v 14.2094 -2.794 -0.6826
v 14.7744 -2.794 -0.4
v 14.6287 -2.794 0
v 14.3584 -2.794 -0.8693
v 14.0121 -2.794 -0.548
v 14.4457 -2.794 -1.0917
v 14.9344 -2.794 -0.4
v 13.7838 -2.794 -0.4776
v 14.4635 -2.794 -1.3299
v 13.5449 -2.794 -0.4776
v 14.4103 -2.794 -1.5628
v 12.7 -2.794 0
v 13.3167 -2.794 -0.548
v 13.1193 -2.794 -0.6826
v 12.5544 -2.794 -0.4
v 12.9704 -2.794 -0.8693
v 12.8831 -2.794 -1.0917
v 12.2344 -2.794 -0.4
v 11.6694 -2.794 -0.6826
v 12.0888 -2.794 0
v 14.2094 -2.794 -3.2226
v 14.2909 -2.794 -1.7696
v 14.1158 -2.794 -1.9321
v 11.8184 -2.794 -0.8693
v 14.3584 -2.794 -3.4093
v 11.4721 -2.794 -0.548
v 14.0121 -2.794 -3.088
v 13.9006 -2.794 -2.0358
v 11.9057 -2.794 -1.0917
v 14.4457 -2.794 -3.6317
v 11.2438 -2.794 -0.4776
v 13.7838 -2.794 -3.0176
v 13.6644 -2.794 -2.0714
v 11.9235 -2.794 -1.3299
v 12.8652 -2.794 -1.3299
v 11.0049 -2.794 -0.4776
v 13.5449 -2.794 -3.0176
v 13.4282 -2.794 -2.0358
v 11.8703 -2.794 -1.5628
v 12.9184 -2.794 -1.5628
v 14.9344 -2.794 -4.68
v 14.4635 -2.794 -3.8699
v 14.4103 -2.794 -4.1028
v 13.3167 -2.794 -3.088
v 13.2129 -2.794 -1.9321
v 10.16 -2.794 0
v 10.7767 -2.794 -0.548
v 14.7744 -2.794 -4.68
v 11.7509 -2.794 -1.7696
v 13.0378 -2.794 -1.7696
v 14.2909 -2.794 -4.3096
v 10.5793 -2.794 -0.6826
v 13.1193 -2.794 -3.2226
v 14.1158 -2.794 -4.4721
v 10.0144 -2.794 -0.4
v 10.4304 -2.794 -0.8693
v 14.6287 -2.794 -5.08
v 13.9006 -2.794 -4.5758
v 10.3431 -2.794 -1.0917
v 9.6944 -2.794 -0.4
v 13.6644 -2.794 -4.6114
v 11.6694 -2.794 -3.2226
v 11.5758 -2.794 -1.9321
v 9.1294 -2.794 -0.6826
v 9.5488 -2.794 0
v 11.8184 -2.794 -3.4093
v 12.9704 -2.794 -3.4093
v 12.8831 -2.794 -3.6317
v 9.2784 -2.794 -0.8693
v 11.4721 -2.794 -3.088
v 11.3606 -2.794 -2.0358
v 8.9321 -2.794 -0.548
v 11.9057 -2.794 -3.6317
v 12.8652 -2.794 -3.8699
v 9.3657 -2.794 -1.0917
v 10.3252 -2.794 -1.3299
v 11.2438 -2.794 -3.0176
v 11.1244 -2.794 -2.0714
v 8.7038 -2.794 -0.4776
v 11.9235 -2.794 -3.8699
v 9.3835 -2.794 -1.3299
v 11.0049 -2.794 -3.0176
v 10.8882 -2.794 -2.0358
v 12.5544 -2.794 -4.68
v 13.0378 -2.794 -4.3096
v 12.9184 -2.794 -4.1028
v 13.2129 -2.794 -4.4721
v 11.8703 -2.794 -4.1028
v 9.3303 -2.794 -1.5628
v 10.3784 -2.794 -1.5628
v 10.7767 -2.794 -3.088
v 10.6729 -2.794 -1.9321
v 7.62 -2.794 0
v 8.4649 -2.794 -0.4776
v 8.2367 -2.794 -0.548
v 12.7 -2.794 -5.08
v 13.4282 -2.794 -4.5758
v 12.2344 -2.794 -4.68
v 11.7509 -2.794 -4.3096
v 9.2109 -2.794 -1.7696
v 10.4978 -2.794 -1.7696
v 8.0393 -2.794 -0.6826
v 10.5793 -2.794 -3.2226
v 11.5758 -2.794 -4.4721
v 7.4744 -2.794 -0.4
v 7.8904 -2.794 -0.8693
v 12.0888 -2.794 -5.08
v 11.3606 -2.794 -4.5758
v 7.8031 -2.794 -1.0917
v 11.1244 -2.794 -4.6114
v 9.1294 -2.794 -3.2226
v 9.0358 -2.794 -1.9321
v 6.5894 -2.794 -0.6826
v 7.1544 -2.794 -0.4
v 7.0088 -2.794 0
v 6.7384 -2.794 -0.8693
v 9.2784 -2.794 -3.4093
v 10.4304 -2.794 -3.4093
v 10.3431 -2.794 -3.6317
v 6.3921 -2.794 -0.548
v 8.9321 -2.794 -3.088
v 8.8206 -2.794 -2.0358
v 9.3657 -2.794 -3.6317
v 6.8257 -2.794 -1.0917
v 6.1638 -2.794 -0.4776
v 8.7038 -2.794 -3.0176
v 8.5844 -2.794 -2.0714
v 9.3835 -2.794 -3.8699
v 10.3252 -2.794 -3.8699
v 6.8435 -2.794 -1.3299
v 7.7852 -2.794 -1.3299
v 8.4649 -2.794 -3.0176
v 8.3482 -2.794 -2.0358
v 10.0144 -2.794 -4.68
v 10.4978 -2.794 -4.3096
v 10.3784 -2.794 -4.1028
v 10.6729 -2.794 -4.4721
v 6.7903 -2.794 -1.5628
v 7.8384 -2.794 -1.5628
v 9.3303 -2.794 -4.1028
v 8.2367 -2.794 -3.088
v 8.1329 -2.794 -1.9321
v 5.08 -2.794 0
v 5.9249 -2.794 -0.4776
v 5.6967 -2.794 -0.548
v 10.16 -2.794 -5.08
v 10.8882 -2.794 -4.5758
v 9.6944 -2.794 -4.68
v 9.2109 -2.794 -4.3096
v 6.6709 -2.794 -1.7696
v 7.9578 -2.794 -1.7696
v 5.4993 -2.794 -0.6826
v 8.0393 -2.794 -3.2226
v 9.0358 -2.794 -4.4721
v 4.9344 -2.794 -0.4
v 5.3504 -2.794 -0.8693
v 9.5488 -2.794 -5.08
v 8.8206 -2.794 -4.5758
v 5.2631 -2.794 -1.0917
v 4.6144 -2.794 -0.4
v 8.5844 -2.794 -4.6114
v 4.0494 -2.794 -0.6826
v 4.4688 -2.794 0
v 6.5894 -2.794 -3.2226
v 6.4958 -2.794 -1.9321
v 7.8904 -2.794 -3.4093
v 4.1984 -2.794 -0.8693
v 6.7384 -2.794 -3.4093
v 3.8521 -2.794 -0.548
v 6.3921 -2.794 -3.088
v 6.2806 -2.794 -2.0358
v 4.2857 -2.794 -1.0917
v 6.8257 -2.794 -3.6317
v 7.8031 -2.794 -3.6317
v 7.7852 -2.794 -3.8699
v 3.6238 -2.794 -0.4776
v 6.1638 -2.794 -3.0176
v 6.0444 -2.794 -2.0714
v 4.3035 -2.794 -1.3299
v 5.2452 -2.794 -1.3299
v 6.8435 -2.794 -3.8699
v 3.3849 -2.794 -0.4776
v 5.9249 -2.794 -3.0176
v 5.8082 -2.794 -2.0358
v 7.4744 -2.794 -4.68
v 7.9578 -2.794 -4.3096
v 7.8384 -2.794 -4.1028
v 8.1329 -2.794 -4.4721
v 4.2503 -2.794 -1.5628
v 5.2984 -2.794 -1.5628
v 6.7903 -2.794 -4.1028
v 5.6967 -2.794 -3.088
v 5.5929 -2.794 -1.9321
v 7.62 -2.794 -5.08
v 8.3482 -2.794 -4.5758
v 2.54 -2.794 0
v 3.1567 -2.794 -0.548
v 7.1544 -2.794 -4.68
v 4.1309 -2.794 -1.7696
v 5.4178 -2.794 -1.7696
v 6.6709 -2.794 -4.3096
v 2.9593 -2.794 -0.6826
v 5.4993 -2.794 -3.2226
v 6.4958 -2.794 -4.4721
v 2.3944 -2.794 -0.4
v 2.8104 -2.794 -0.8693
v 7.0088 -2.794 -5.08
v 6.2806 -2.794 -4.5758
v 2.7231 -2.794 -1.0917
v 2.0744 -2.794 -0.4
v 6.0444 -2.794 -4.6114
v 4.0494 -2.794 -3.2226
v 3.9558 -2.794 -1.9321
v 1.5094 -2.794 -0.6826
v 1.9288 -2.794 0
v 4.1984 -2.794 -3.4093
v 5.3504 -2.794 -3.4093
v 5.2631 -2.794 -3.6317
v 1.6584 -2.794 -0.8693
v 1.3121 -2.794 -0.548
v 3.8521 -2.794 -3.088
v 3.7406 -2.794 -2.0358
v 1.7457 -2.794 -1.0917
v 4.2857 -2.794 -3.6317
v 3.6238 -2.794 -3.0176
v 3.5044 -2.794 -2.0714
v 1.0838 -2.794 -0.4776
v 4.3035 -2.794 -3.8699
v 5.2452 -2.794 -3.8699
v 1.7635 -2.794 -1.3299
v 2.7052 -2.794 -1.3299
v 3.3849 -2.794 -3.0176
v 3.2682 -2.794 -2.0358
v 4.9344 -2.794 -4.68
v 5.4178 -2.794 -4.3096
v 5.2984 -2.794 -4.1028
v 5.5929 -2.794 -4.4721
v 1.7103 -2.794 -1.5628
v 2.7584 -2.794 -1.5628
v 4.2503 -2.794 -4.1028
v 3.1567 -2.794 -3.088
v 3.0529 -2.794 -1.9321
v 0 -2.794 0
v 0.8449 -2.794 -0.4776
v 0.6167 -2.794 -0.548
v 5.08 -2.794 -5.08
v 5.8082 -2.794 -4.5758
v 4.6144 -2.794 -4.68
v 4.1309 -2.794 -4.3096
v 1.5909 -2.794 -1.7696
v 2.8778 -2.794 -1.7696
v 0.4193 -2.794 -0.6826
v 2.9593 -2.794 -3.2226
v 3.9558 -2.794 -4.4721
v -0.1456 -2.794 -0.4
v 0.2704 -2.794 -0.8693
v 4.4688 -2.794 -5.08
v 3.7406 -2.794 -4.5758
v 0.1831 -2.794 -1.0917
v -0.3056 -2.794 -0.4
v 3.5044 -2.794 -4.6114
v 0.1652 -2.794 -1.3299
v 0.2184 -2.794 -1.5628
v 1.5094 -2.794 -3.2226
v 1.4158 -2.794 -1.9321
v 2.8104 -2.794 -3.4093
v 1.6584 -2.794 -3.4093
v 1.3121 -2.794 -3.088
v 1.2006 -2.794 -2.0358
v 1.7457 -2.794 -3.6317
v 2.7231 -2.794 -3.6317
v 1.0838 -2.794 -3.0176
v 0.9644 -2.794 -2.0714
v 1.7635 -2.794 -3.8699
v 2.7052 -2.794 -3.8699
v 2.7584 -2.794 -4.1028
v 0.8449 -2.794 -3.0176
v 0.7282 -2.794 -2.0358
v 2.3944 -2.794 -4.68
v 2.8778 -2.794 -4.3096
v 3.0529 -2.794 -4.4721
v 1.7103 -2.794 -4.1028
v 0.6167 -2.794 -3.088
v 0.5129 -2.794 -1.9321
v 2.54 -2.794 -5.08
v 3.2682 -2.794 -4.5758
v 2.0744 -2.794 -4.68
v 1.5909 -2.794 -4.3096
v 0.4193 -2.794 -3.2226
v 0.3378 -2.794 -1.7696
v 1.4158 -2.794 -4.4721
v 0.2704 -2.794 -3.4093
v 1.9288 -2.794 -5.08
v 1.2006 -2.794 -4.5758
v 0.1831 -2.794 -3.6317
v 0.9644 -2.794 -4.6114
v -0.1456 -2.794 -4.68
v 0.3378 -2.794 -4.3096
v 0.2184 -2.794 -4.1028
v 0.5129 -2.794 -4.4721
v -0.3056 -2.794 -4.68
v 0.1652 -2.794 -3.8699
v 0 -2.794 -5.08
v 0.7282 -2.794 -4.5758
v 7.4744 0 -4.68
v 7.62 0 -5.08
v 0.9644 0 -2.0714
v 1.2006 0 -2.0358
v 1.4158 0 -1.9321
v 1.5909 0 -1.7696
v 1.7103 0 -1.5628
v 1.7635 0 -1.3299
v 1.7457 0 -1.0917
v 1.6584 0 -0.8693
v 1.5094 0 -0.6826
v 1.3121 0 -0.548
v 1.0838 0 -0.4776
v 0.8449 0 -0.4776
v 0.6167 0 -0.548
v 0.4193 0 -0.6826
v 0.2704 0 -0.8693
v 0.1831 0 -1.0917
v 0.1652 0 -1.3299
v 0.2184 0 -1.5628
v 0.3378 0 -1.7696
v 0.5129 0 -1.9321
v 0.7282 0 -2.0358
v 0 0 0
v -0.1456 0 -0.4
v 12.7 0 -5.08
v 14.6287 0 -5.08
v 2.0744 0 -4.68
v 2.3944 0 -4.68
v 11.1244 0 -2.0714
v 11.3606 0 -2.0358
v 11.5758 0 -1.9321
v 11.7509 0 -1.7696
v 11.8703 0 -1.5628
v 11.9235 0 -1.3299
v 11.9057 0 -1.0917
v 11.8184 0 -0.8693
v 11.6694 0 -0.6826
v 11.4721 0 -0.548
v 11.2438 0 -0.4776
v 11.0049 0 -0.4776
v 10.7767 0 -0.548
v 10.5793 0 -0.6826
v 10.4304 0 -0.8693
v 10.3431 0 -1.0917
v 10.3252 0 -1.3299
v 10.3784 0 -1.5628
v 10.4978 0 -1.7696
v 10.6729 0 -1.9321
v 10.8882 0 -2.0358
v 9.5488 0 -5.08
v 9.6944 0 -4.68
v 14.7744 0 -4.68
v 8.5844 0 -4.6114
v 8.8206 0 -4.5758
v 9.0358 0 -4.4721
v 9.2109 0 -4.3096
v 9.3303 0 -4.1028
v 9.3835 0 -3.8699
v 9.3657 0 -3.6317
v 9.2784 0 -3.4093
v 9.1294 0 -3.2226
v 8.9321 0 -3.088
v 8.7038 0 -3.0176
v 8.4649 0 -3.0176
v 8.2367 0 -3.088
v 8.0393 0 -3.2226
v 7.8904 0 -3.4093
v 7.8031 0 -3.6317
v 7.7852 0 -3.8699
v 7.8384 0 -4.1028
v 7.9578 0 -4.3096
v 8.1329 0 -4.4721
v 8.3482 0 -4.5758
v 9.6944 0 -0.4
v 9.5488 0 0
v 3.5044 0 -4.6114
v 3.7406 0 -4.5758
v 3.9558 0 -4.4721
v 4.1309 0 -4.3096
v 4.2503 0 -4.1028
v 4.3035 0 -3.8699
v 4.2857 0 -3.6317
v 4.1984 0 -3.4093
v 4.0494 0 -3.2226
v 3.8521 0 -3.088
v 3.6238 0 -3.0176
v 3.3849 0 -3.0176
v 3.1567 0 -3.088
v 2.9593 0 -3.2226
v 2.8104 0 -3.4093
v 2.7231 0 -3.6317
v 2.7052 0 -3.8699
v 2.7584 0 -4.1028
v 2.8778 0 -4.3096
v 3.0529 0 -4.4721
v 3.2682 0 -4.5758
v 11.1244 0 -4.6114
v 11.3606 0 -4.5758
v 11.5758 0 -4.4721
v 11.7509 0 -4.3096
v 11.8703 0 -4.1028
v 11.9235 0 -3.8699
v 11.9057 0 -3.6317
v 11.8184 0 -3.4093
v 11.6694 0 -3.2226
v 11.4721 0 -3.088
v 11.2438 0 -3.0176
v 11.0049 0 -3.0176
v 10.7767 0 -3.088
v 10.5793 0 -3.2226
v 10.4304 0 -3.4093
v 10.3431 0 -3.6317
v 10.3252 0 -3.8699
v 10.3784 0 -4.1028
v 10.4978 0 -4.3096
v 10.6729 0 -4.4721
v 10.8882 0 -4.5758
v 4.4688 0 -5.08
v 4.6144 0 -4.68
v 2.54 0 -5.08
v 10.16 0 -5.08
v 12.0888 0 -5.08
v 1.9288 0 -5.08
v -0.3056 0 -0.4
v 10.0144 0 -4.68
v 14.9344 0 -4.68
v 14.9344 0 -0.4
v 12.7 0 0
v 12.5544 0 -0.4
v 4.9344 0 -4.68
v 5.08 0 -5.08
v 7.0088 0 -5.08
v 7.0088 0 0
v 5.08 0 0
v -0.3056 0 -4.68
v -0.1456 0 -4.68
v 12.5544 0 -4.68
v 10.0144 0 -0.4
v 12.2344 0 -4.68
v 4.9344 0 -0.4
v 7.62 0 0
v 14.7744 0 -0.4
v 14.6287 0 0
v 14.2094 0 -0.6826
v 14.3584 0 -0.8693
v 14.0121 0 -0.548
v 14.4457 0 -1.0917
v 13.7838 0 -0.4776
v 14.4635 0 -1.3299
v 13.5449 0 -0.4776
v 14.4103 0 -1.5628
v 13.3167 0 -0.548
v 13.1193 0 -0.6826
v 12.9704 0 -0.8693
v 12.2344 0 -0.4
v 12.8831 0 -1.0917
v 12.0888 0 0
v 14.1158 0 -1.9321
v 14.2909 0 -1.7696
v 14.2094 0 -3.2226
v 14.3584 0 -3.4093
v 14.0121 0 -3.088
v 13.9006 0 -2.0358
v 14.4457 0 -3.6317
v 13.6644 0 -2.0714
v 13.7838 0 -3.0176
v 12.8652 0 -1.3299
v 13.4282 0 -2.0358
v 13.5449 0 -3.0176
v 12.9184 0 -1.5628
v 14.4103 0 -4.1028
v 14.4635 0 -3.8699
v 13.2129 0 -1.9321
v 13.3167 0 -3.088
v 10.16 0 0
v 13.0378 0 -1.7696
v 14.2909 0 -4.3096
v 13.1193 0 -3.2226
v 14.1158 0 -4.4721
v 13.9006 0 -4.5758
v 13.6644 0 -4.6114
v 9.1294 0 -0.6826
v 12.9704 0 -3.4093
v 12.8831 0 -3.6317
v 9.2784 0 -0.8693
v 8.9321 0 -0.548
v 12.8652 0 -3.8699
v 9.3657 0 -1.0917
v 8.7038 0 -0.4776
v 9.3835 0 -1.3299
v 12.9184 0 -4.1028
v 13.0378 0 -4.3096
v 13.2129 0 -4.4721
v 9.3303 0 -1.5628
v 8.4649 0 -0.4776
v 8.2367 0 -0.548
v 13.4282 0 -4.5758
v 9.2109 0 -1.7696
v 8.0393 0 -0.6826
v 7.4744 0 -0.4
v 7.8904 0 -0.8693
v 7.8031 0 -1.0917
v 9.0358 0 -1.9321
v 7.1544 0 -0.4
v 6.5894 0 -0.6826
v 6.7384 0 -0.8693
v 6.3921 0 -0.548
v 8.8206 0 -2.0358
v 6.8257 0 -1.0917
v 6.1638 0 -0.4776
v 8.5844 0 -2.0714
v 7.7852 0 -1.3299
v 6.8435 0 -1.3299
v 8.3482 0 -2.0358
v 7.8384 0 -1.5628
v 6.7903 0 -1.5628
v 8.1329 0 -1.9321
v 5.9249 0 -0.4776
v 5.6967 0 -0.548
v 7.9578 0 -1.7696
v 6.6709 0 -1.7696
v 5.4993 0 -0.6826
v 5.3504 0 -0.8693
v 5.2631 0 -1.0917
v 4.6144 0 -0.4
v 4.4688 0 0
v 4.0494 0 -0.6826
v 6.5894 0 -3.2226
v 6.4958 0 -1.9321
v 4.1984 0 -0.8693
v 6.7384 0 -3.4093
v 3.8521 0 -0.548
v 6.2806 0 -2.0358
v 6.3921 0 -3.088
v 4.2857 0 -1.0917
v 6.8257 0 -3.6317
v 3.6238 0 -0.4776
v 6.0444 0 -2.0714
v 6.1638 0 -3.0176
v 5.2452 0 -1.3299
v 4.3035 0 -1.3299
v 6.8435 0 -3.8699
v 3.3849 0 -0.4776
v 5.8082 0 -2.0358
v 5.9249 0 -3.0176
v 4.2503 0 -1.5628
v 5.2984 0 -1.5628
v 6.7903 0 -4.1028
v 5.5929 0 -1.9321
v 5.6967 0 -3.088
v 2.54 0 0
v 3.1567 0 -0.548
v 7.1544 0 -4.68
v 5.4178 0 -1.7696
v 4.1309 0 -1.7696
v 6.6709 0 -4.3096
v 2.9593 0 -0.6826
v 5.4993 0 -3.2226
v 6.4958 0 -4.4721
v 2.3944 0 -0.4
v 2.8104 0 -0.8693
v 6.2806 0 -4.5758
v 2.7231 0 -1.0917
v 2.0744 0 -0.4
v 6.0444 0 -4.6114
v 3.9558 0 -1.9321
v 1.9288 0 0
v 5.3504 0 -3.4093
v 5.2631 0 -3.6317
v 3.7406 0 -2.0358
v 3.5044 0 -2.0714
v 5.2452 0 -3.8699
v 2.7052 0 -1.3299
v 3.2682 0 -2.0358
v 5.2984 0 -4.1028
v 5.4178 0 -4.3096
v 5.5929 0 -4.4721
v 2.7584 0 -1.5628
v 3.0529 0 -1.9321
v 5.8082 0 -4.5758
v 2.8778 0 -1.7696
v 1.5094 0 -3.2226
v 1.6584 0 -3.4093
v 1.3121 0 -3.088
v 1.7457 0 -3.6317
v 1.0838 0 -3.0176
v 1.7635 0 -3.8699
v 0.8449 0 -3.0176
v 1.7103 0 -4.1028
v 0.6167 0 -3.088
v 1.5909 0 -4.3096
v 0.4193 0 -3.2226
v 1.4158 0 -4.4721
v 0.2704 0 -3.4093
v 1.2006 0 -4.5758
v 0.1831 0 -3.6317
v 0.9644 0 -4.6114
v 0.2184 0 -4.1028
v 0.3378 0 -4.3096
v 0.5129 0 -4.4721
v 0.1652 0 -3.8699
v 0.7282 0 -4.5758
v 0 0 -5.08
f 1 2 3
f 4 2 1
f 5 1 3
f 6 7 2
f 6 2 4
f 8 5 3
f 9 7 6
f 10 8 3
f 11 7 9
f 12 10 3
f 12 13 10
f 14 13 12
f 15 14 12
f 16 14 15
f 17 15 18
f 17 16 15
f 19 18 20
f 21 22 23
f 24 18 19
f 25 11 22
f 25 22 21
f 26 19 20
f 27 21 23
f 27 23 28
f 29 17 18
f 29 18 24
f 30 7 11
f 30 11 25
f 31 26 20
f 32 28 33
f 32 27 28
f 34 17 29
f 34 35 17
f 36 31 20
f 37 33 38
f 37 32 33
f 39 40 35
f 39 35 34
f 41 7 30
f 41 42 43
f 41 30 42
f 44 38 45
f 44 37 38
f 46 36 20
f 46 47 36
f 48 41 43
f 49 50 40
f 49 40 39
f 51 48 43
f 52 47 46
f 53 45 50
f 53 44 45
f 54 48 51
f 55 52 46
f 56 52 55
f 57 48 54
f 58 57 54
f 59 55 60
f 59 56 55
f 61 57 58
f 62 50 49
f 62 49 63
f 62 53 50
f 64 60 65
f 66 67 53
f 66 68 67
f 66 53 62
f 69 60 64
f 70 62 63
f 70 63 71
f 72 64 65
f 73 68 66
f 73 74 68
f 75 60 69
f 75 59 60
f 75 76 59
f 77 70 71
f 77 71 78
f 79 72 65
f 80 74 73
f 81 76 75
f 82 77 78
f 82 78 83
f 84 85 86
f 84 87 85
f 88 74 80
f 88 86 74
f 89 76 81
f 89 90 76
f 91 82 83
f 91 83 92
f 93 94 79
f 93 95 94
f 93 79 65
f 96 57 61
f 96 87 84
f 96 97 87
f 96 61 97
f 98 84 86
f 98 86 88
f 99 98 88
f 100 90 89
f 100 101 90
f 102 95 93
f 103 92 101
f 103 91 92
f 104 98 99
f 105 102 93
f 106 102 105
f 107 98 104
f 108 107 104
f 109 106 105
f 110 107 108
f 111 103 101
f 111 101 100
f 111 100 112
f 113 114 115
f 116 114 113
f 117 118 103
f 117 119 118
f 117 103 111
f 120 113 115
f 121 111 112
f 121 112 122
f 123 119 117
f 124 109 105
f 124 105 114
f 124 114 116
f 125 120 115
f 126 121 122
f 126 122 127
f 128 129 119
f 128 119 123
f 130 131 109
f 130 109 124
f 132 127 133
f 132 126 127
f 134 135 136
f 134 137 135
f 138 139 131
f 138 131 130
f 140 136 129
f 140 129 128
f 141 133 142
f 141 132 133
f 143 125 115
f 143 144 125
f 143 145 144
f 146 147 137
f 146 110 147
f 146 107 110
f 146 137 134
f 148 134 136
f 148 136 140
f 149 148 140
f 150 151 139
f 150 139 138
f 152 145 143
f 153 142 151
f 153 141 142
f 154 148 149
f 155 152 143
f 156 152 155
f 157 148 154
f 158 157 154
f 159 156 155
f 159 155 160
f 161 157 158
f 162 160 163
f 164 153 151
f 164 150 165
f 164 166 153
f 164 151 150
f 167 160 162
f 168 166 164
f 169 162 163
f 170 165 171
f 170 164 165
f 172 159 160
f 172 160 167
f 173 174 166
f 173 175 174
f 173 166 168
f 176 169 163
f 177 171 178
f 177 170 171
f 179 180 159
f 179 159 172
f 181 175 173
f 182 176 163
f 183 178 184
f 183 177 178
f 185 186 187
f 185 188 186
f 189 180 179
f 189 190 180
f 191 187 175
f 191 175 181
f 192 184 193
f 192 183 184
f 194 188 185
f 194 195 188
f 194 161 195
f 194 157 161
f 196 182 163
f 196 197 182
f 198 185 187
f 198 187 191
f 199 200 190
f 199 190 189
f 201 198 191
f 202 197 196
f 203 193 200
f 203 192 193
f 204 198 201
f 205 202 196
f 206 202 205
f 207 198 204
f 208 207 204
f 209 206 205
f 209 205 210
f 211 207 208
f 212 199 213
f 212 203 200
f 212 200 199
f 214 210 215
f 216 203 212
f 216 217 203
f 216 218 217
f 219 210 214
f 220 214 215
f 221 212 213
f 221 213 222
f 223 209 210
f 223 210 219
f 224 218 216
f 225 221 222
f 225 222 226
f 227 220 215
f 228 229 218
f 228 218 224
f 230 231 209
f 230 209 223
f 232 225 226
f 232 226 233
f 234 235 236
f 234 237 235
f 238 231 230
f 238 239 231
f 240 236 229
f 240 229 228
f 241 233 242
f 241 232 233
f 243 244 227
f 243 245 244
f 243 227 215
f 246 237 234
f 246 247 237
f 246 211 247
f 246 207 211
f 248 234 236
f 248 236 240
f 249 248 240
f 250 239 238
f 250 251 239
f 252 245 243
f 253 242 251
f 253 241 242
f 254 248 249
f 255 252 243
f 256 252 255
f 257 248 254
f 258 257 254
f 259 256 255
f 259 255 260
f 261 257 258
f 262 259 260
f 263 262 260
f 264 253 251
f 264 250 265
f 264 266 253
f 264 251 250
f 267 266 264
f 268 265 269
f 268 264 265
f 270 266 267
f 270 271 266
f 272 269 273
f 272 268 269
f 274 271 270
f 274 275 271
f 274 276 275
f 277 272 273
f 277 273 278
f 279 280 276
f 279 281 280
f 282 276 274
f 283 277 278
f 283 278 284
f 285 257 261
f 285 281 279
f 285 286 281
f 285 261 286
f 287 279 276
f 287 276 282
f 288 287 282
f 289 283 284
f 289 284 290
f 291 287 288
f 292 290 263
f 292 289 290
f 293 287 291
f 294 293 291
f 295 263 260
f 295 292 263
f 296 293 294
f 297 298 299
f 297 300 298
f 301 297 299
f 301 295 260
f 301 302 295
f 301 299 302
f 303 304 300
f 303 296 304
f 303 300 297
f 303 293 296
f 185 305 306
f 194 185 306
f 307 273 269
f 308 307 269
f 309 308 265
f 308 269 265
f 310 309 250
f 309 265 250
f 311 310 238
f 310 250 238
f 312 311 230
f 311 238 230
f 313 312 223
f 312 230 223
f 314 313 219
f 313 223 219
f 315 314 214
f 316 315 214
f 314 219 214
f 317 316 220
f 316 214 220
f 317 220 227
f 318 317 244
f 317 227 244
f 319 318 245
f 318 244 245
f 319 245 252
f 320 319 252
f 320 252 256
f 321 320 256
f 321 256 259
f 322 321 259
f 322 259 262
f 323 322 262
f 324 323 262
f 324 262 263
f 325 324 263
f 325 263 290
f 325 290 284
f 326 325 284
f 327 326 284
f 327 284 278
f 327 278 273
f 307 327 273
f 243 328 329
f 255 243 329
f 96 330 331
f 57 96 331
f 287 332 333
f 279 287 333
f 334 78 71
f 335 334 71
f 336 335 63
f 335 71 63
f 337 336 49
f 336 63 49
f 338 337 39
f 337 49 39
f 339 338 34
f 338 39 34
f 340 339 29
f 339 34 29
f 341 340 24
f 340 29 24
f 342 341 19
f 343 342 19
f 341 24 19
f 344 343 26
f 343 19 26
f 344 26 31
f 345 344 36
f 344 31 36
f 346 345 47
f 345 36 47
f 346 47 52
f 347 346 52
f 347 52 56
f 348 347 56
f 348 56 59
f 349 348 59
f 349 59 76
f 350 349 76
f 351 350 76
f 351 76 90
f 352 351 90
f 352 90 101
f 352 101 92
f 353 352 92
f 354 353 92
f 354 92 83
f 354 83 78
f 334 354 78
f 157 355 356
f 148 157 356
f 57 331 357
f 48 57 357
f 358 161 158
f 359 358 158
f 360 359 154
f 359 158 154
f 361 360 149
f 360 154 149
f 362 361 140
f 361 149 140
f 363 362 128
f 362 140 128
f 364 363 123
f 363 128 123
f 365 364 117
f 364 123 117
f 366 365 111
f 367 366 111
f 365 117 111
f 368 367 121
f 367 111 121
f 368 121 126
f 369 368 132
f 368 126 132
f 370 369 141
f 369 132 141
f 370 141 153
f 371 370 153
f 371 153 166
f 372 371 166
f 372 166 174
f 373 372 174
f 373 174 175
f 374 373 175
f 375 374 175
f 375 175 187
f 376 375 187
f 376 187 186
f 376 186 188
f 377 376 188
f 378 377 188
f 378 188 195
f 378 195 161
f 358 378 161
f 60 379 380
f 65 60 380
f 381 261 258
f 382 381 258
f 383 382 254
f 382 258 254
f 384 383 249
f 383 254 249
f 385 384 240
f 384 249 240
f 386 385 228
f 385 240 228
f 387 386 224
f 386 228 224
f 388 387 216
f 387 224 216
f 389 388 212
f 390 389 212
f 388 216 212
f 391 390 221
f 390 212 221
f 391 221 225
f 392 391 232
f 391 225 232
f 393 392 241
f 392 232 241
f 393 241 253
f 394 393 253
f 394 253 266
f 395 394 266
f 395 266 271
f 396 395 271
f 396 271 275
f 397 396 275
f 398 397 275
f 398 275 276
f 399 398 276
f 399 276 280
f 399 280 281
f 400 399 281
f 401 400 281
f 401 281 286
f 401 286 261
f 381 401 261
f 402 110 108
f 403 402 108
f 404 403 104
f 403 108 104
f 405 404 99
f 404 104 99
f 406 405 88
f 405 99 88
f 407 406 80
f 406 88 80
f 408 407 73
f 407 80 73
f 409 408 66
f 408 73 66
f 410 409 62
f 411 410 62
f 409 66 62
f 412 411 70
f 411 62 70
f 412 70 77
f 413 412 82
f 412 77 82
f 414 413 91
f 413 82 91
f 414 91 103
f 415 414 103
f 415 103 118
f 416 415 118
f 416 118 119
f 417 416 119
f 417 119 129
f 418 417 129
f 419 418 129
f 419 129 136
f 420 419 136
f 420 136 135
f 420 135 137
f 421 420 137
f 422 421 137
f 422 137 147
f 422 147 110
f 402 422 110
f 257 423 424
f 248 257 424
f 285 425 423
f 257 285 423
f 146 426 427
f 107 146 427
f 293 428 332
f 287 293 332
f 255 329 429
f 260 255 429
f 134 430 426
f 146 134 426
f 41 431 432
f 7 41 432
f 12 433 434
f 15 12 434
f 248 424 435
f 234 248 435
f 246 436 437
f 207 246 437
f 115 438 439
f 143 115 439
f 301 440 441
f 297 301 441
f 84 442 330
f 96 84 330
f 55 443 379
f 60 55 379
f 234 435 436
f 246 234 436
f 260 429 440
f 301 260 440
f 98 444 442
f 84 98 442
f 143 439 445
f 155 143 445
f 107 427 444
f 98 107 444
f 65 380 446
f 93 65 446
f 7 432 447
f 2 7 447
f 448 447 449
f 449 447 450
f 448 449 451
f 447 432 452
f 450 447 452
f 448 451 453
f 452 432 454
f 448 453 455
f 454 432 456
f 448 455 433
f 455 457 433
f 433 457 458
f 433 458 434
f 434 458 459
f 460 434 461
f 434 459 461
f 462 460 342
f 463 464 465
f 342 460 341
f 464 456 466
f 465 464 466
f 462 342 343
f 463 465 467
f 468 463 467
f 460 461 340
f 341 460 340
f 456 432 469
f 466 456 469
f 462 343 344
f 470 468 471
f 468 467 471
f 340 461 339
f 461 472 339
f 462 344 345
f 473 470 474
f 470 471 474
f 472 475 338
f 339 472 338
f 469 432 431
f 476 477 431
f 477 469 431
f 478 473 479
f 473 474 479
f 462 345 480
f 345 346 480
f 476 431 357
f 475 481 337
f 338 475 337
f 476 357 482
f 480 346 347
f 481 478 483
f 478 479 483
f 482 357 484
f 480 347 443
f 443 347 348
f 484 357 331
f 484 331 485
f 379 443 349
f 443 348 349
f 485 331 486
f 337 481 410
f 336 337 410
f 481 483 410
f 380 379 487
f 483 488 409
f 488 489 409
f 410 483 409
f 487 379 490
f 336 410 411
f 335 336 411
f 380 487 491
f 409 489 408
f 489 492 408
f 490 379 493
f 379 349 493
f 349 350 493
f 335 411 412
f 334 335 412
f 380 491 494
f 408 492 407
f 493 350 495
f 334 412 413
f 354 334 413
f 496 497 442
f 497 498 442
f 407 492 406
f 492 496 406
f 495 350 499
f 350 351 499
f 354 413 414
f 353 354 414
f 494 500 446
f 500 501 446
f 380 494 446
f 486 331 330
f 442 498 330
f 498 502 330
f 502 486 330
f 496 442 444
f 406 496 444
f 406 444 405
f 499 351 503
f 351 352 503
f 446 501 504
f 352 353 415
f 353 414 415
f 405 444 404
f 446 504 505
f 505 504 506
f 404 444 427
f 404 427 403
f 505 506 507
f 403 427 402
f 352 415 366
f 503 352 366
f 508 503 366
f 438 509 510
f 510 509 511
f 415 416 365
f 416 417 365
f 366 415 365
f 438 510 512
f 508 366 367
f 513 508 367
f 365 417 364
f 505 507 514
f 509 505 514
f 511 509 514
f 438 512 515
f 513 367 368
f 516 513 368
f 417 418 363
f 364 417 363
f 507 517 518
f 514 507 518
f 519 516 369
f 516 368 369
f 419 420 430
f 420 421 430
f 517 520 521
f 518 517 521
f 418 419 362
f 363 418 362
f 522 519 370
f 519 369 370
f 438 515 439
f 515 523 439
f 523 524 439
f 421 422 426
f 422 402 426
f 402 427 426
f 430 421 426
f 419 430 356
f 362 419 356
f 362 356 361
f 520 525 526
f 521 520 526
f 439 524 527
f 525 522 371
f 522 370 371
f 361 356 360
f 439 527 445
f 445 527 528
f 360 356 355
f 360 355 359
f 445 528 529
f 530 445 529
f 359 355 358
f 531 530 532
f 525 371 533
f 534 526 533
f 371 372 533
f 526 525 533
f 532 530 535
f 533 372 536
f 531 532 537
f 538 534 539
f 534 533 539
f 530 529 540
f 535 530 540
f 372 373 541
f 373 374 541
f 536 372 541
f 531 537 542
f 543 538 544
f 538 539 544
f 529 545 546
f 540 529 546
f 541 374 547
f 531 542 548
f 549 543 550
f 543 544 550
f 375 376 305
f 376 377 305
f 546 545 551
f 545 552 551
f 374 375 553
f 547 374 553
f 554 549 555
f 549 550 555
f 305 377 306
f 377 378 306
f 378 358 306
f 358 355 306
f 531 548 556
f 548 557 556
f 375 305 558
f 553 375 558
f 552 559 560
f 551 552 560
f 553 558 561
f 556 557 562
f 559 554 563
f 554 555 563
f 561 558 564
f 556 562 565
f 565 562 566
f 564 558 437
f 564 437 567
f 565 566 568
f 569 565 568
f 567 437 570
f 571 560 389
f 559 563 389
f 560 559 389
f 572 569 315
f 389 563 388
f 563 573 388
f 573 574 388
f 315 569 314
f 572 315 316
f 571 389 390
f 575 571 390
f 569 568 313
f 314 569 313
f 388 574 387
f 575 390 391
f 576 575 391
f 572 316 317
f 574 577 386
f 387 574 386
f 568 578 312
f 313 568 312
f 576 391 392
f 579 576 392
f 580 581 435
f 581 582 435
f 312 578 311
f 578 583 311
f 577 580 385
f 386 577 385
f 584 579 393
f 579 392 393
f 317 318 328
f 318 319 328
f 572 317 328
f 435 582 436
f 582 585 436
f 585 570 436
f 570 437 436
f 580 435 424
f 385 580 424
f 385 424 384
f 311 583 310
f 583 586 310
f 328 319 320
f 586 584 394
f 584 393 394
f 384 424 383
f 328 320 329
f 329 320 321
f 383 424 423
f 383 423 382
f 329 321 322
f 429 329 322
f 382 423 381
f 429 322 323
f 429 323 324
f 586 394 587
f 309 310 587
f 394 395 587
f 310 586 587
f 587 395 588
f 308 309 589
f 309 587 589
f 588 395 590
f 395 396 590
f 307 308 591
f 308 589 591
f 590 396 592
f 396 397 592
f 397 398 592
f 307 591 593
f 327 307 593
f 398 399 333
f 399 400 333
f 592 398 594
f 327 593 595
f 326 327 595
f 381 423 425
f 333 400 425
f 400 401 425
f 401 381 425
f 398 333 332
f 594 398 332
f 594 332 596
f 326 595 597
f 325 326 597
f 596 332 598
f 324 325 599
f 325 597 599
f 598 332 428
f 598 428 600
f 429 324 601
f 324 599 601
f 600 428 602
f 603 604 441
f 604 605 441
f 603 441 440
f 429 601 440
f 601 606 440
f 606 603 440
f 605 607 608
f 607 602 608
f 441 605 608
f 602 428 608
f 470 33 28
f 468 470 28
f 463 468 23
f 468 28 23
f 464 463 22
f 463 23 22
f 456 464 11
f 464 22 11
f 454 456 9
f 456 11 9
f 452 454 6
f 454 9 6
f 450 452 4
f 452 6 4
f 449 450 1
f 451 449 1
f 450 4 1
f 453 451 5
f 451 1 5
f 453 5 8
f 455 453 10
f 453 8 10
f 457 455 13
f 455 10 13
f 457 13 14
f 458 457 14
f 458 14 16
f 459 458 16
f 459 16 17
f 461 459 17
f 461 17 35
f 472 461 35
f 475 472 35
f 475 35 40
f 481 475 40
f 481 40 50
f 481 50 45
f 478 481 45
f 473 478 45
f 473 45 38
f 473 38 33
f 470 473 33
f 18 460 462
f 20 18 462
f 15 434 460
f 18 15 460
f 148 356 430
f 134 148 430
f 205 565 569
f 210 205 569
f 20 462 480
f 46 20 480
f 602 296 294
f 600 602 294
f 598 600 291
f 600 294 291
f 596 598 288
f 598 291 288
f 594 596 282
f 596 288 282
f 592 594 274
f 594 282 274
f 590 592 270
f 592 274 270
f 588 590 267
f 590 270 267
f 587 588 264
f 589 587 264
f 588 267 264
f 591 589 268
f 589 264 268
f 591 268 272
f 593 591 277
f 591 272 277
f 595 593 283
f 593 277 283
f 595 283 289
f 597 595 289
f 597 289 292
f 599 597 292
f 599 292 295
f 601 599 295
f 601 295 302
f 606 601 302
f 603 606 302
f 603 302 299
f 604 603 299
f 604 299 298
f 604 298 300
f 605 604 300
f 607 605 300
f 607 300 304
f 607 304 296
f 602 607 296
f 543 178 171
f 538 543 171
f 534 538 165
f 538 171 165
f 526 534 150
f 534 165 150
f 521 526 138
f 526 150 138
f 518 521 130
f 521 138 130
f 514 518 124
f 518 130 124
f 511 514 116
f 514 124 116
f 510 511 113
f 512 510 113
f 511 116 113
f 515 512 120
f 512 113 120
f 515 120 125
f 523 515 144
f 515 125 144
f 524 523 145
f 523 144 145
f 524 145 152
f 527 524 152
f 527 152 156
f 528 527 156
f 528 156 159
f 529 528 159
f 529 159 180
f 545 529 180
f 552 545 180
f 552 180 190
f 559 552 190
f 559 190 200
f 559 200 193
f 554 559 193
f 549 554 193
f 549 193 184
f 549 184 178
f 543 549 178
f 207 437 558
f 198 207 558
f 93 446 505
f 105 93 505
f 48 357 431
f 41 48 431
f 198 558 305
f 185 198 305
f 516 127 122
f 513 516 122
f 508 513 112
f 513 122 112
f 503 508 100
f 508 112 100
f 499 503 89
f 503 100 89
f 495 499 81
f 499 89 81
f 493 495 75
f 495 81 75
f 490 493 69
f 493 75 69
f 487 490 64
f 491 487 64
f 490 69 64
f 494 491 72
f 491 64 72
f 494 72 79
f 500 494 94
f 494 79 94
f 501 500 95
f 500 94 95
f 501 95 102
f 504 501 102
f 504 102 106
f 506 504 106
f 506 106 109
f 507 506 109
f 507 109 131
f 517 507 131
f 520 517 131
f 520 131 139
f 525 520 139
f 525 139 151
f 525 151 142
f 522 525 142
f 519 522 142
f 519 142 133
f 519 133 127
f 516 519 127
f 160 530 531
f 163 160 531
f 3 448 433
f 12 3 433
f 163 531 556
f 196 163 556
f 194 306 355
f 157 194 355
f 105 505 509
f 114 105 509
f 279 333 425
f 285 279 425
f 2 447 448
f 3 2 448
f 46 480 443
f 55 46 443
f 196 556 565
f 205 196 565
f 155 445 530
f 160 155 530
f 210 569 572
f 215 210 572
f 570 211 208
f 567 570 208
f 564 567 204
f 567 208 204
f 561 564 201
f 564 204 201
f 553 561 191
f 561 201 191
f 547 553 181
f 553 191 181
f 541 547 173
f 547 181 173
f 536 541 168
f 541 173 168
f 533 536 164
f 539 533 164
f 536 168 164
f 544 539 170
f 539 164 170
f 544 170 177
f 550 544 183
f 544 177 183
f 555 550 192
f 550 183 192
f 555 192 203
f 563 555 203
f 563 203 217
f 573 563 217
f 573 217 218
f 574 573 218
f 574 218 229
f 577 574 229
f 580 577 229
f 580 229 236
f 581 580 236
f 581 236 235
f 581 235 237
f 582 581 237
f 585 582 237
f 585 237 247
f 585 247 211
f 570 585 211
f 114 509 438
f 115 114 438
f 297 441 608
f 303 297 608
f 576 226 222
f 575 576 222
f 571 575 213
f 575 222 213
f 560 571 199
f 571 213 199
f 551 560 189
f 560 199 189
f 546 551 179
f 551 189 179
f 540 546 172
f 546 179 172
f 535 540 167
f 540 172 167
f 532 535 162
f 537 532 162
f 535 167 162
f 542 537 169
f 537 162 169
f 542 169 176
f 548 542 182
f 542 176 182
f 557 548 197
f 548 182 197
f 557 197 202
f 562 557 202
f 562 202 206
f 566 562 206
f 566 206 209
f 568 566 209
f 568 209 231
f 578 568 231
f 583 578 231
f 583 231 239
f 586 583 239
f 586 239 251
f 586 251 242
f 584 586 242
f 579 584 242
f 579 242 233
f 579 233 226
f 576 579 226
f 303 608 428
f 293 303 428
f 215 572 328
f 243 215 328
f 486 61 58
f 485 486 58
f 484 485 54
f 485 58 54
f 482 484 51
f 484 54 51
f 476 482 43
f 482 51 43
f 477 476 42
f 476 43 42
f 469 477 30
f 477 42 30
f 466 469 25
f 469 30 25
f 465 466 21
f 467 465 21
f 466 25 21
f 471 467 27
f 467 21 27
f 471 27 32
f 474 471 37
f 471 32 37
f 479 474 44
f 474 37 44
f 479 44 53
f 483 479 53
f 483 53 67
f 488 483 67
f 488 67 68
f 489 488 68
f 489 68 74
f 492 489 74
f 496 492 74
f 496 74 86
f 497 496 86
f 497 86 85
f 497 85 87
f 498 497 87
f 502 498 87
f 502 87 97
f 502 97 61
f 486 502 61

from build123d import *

# Parameters (mm, degrees)
EXTRUDE1_DEPTH       = 2.794
HOLE1_D              = 1.60274
EXTRUDE2_DEPTH       = 2.794
LPATTERN1_COUNT      = 6
LPATTERN1_PITCH      = 2.54
LPATTERN1_COUNT_DIR2 = 2
LPATTERN1_PITCH_DIR2 = 2.54
LPATTERN2_COUNT      = 35
LPATTERN2_PITCH      = 2.54


with BuildPart() as part:
    # Sketch1 → Extrude1 (new body)
    with BuildSketch(Plane(origin=(0, 0, 0), x_dir=(1, 0, 0), z_dir=(0, 1, 0))):
        Polygon((14.934373708, 0.40005), (14.774353708, 0.40005), (14.628747416, 0), (0, 0), (-0.145606292, 0.40005), (-0.305626292, 0.40005), (-0.305626292, 4.67995), (-0.145606292, 4.67995), (0, 5.08), (14.628747416, 5.08), (14.774353708, 4.67995), (14.934373708, 4.67995), align=None)
    extrude(amount=-EXTRUDE1_DEPTH)

    # Hole1 (through all)
    with Locations(Plane(origin=(0.964373708, 0, -1.27), x_dir=(0, 0, 1), z_dir=(0, 1, 0))):
        with Locations((0, 0)):
            hole1 = Hole(HOLE1_D / 2)

    # Sketch4 → Extrude2 (cut)
    with BuildSketch(Plane(origin=(0, 0, 0), x_dir=(1, 0, 0), z_dir=(0, 1, 0))):
        Polygon((1.928772816, 0), (2.5399746, 0), (2.394368308, 0.40005), (2.074379108, 0.40005), align=None)
        Polygon((2.074379108, 4.67995), (2.394368308, 4.67995), (2.5399746, 5.08), (1.928772816, 5.08), align=None)
    extrude2 = extrude(amount=-EXTRUDE2_DEPTH, mode=Mode.SUBTRACT)

    # LPattern1: Hole1 6 × 2
    with Locations(*[(i * LPATTERN1_PITCH, 0, -j * LPATTERN1_PITCH_DIR2) for i in range(LPATTERN1_COUNT) for j in range(LPATTERN1_COUNT_DIR2) if (i, j) != (0, 0)]):
        add(hole1, mode=Mode.SUBTRACT)

    # LPattern2: Extrude2 ×35
    with Locations(*[(i * LPATTERN2_PITCH, 0, 0) for i in range(1, LPATTERN2_COUNT)]):
        add(extrude2, mode=Mode.SUBTRACT)


solid = part.part
